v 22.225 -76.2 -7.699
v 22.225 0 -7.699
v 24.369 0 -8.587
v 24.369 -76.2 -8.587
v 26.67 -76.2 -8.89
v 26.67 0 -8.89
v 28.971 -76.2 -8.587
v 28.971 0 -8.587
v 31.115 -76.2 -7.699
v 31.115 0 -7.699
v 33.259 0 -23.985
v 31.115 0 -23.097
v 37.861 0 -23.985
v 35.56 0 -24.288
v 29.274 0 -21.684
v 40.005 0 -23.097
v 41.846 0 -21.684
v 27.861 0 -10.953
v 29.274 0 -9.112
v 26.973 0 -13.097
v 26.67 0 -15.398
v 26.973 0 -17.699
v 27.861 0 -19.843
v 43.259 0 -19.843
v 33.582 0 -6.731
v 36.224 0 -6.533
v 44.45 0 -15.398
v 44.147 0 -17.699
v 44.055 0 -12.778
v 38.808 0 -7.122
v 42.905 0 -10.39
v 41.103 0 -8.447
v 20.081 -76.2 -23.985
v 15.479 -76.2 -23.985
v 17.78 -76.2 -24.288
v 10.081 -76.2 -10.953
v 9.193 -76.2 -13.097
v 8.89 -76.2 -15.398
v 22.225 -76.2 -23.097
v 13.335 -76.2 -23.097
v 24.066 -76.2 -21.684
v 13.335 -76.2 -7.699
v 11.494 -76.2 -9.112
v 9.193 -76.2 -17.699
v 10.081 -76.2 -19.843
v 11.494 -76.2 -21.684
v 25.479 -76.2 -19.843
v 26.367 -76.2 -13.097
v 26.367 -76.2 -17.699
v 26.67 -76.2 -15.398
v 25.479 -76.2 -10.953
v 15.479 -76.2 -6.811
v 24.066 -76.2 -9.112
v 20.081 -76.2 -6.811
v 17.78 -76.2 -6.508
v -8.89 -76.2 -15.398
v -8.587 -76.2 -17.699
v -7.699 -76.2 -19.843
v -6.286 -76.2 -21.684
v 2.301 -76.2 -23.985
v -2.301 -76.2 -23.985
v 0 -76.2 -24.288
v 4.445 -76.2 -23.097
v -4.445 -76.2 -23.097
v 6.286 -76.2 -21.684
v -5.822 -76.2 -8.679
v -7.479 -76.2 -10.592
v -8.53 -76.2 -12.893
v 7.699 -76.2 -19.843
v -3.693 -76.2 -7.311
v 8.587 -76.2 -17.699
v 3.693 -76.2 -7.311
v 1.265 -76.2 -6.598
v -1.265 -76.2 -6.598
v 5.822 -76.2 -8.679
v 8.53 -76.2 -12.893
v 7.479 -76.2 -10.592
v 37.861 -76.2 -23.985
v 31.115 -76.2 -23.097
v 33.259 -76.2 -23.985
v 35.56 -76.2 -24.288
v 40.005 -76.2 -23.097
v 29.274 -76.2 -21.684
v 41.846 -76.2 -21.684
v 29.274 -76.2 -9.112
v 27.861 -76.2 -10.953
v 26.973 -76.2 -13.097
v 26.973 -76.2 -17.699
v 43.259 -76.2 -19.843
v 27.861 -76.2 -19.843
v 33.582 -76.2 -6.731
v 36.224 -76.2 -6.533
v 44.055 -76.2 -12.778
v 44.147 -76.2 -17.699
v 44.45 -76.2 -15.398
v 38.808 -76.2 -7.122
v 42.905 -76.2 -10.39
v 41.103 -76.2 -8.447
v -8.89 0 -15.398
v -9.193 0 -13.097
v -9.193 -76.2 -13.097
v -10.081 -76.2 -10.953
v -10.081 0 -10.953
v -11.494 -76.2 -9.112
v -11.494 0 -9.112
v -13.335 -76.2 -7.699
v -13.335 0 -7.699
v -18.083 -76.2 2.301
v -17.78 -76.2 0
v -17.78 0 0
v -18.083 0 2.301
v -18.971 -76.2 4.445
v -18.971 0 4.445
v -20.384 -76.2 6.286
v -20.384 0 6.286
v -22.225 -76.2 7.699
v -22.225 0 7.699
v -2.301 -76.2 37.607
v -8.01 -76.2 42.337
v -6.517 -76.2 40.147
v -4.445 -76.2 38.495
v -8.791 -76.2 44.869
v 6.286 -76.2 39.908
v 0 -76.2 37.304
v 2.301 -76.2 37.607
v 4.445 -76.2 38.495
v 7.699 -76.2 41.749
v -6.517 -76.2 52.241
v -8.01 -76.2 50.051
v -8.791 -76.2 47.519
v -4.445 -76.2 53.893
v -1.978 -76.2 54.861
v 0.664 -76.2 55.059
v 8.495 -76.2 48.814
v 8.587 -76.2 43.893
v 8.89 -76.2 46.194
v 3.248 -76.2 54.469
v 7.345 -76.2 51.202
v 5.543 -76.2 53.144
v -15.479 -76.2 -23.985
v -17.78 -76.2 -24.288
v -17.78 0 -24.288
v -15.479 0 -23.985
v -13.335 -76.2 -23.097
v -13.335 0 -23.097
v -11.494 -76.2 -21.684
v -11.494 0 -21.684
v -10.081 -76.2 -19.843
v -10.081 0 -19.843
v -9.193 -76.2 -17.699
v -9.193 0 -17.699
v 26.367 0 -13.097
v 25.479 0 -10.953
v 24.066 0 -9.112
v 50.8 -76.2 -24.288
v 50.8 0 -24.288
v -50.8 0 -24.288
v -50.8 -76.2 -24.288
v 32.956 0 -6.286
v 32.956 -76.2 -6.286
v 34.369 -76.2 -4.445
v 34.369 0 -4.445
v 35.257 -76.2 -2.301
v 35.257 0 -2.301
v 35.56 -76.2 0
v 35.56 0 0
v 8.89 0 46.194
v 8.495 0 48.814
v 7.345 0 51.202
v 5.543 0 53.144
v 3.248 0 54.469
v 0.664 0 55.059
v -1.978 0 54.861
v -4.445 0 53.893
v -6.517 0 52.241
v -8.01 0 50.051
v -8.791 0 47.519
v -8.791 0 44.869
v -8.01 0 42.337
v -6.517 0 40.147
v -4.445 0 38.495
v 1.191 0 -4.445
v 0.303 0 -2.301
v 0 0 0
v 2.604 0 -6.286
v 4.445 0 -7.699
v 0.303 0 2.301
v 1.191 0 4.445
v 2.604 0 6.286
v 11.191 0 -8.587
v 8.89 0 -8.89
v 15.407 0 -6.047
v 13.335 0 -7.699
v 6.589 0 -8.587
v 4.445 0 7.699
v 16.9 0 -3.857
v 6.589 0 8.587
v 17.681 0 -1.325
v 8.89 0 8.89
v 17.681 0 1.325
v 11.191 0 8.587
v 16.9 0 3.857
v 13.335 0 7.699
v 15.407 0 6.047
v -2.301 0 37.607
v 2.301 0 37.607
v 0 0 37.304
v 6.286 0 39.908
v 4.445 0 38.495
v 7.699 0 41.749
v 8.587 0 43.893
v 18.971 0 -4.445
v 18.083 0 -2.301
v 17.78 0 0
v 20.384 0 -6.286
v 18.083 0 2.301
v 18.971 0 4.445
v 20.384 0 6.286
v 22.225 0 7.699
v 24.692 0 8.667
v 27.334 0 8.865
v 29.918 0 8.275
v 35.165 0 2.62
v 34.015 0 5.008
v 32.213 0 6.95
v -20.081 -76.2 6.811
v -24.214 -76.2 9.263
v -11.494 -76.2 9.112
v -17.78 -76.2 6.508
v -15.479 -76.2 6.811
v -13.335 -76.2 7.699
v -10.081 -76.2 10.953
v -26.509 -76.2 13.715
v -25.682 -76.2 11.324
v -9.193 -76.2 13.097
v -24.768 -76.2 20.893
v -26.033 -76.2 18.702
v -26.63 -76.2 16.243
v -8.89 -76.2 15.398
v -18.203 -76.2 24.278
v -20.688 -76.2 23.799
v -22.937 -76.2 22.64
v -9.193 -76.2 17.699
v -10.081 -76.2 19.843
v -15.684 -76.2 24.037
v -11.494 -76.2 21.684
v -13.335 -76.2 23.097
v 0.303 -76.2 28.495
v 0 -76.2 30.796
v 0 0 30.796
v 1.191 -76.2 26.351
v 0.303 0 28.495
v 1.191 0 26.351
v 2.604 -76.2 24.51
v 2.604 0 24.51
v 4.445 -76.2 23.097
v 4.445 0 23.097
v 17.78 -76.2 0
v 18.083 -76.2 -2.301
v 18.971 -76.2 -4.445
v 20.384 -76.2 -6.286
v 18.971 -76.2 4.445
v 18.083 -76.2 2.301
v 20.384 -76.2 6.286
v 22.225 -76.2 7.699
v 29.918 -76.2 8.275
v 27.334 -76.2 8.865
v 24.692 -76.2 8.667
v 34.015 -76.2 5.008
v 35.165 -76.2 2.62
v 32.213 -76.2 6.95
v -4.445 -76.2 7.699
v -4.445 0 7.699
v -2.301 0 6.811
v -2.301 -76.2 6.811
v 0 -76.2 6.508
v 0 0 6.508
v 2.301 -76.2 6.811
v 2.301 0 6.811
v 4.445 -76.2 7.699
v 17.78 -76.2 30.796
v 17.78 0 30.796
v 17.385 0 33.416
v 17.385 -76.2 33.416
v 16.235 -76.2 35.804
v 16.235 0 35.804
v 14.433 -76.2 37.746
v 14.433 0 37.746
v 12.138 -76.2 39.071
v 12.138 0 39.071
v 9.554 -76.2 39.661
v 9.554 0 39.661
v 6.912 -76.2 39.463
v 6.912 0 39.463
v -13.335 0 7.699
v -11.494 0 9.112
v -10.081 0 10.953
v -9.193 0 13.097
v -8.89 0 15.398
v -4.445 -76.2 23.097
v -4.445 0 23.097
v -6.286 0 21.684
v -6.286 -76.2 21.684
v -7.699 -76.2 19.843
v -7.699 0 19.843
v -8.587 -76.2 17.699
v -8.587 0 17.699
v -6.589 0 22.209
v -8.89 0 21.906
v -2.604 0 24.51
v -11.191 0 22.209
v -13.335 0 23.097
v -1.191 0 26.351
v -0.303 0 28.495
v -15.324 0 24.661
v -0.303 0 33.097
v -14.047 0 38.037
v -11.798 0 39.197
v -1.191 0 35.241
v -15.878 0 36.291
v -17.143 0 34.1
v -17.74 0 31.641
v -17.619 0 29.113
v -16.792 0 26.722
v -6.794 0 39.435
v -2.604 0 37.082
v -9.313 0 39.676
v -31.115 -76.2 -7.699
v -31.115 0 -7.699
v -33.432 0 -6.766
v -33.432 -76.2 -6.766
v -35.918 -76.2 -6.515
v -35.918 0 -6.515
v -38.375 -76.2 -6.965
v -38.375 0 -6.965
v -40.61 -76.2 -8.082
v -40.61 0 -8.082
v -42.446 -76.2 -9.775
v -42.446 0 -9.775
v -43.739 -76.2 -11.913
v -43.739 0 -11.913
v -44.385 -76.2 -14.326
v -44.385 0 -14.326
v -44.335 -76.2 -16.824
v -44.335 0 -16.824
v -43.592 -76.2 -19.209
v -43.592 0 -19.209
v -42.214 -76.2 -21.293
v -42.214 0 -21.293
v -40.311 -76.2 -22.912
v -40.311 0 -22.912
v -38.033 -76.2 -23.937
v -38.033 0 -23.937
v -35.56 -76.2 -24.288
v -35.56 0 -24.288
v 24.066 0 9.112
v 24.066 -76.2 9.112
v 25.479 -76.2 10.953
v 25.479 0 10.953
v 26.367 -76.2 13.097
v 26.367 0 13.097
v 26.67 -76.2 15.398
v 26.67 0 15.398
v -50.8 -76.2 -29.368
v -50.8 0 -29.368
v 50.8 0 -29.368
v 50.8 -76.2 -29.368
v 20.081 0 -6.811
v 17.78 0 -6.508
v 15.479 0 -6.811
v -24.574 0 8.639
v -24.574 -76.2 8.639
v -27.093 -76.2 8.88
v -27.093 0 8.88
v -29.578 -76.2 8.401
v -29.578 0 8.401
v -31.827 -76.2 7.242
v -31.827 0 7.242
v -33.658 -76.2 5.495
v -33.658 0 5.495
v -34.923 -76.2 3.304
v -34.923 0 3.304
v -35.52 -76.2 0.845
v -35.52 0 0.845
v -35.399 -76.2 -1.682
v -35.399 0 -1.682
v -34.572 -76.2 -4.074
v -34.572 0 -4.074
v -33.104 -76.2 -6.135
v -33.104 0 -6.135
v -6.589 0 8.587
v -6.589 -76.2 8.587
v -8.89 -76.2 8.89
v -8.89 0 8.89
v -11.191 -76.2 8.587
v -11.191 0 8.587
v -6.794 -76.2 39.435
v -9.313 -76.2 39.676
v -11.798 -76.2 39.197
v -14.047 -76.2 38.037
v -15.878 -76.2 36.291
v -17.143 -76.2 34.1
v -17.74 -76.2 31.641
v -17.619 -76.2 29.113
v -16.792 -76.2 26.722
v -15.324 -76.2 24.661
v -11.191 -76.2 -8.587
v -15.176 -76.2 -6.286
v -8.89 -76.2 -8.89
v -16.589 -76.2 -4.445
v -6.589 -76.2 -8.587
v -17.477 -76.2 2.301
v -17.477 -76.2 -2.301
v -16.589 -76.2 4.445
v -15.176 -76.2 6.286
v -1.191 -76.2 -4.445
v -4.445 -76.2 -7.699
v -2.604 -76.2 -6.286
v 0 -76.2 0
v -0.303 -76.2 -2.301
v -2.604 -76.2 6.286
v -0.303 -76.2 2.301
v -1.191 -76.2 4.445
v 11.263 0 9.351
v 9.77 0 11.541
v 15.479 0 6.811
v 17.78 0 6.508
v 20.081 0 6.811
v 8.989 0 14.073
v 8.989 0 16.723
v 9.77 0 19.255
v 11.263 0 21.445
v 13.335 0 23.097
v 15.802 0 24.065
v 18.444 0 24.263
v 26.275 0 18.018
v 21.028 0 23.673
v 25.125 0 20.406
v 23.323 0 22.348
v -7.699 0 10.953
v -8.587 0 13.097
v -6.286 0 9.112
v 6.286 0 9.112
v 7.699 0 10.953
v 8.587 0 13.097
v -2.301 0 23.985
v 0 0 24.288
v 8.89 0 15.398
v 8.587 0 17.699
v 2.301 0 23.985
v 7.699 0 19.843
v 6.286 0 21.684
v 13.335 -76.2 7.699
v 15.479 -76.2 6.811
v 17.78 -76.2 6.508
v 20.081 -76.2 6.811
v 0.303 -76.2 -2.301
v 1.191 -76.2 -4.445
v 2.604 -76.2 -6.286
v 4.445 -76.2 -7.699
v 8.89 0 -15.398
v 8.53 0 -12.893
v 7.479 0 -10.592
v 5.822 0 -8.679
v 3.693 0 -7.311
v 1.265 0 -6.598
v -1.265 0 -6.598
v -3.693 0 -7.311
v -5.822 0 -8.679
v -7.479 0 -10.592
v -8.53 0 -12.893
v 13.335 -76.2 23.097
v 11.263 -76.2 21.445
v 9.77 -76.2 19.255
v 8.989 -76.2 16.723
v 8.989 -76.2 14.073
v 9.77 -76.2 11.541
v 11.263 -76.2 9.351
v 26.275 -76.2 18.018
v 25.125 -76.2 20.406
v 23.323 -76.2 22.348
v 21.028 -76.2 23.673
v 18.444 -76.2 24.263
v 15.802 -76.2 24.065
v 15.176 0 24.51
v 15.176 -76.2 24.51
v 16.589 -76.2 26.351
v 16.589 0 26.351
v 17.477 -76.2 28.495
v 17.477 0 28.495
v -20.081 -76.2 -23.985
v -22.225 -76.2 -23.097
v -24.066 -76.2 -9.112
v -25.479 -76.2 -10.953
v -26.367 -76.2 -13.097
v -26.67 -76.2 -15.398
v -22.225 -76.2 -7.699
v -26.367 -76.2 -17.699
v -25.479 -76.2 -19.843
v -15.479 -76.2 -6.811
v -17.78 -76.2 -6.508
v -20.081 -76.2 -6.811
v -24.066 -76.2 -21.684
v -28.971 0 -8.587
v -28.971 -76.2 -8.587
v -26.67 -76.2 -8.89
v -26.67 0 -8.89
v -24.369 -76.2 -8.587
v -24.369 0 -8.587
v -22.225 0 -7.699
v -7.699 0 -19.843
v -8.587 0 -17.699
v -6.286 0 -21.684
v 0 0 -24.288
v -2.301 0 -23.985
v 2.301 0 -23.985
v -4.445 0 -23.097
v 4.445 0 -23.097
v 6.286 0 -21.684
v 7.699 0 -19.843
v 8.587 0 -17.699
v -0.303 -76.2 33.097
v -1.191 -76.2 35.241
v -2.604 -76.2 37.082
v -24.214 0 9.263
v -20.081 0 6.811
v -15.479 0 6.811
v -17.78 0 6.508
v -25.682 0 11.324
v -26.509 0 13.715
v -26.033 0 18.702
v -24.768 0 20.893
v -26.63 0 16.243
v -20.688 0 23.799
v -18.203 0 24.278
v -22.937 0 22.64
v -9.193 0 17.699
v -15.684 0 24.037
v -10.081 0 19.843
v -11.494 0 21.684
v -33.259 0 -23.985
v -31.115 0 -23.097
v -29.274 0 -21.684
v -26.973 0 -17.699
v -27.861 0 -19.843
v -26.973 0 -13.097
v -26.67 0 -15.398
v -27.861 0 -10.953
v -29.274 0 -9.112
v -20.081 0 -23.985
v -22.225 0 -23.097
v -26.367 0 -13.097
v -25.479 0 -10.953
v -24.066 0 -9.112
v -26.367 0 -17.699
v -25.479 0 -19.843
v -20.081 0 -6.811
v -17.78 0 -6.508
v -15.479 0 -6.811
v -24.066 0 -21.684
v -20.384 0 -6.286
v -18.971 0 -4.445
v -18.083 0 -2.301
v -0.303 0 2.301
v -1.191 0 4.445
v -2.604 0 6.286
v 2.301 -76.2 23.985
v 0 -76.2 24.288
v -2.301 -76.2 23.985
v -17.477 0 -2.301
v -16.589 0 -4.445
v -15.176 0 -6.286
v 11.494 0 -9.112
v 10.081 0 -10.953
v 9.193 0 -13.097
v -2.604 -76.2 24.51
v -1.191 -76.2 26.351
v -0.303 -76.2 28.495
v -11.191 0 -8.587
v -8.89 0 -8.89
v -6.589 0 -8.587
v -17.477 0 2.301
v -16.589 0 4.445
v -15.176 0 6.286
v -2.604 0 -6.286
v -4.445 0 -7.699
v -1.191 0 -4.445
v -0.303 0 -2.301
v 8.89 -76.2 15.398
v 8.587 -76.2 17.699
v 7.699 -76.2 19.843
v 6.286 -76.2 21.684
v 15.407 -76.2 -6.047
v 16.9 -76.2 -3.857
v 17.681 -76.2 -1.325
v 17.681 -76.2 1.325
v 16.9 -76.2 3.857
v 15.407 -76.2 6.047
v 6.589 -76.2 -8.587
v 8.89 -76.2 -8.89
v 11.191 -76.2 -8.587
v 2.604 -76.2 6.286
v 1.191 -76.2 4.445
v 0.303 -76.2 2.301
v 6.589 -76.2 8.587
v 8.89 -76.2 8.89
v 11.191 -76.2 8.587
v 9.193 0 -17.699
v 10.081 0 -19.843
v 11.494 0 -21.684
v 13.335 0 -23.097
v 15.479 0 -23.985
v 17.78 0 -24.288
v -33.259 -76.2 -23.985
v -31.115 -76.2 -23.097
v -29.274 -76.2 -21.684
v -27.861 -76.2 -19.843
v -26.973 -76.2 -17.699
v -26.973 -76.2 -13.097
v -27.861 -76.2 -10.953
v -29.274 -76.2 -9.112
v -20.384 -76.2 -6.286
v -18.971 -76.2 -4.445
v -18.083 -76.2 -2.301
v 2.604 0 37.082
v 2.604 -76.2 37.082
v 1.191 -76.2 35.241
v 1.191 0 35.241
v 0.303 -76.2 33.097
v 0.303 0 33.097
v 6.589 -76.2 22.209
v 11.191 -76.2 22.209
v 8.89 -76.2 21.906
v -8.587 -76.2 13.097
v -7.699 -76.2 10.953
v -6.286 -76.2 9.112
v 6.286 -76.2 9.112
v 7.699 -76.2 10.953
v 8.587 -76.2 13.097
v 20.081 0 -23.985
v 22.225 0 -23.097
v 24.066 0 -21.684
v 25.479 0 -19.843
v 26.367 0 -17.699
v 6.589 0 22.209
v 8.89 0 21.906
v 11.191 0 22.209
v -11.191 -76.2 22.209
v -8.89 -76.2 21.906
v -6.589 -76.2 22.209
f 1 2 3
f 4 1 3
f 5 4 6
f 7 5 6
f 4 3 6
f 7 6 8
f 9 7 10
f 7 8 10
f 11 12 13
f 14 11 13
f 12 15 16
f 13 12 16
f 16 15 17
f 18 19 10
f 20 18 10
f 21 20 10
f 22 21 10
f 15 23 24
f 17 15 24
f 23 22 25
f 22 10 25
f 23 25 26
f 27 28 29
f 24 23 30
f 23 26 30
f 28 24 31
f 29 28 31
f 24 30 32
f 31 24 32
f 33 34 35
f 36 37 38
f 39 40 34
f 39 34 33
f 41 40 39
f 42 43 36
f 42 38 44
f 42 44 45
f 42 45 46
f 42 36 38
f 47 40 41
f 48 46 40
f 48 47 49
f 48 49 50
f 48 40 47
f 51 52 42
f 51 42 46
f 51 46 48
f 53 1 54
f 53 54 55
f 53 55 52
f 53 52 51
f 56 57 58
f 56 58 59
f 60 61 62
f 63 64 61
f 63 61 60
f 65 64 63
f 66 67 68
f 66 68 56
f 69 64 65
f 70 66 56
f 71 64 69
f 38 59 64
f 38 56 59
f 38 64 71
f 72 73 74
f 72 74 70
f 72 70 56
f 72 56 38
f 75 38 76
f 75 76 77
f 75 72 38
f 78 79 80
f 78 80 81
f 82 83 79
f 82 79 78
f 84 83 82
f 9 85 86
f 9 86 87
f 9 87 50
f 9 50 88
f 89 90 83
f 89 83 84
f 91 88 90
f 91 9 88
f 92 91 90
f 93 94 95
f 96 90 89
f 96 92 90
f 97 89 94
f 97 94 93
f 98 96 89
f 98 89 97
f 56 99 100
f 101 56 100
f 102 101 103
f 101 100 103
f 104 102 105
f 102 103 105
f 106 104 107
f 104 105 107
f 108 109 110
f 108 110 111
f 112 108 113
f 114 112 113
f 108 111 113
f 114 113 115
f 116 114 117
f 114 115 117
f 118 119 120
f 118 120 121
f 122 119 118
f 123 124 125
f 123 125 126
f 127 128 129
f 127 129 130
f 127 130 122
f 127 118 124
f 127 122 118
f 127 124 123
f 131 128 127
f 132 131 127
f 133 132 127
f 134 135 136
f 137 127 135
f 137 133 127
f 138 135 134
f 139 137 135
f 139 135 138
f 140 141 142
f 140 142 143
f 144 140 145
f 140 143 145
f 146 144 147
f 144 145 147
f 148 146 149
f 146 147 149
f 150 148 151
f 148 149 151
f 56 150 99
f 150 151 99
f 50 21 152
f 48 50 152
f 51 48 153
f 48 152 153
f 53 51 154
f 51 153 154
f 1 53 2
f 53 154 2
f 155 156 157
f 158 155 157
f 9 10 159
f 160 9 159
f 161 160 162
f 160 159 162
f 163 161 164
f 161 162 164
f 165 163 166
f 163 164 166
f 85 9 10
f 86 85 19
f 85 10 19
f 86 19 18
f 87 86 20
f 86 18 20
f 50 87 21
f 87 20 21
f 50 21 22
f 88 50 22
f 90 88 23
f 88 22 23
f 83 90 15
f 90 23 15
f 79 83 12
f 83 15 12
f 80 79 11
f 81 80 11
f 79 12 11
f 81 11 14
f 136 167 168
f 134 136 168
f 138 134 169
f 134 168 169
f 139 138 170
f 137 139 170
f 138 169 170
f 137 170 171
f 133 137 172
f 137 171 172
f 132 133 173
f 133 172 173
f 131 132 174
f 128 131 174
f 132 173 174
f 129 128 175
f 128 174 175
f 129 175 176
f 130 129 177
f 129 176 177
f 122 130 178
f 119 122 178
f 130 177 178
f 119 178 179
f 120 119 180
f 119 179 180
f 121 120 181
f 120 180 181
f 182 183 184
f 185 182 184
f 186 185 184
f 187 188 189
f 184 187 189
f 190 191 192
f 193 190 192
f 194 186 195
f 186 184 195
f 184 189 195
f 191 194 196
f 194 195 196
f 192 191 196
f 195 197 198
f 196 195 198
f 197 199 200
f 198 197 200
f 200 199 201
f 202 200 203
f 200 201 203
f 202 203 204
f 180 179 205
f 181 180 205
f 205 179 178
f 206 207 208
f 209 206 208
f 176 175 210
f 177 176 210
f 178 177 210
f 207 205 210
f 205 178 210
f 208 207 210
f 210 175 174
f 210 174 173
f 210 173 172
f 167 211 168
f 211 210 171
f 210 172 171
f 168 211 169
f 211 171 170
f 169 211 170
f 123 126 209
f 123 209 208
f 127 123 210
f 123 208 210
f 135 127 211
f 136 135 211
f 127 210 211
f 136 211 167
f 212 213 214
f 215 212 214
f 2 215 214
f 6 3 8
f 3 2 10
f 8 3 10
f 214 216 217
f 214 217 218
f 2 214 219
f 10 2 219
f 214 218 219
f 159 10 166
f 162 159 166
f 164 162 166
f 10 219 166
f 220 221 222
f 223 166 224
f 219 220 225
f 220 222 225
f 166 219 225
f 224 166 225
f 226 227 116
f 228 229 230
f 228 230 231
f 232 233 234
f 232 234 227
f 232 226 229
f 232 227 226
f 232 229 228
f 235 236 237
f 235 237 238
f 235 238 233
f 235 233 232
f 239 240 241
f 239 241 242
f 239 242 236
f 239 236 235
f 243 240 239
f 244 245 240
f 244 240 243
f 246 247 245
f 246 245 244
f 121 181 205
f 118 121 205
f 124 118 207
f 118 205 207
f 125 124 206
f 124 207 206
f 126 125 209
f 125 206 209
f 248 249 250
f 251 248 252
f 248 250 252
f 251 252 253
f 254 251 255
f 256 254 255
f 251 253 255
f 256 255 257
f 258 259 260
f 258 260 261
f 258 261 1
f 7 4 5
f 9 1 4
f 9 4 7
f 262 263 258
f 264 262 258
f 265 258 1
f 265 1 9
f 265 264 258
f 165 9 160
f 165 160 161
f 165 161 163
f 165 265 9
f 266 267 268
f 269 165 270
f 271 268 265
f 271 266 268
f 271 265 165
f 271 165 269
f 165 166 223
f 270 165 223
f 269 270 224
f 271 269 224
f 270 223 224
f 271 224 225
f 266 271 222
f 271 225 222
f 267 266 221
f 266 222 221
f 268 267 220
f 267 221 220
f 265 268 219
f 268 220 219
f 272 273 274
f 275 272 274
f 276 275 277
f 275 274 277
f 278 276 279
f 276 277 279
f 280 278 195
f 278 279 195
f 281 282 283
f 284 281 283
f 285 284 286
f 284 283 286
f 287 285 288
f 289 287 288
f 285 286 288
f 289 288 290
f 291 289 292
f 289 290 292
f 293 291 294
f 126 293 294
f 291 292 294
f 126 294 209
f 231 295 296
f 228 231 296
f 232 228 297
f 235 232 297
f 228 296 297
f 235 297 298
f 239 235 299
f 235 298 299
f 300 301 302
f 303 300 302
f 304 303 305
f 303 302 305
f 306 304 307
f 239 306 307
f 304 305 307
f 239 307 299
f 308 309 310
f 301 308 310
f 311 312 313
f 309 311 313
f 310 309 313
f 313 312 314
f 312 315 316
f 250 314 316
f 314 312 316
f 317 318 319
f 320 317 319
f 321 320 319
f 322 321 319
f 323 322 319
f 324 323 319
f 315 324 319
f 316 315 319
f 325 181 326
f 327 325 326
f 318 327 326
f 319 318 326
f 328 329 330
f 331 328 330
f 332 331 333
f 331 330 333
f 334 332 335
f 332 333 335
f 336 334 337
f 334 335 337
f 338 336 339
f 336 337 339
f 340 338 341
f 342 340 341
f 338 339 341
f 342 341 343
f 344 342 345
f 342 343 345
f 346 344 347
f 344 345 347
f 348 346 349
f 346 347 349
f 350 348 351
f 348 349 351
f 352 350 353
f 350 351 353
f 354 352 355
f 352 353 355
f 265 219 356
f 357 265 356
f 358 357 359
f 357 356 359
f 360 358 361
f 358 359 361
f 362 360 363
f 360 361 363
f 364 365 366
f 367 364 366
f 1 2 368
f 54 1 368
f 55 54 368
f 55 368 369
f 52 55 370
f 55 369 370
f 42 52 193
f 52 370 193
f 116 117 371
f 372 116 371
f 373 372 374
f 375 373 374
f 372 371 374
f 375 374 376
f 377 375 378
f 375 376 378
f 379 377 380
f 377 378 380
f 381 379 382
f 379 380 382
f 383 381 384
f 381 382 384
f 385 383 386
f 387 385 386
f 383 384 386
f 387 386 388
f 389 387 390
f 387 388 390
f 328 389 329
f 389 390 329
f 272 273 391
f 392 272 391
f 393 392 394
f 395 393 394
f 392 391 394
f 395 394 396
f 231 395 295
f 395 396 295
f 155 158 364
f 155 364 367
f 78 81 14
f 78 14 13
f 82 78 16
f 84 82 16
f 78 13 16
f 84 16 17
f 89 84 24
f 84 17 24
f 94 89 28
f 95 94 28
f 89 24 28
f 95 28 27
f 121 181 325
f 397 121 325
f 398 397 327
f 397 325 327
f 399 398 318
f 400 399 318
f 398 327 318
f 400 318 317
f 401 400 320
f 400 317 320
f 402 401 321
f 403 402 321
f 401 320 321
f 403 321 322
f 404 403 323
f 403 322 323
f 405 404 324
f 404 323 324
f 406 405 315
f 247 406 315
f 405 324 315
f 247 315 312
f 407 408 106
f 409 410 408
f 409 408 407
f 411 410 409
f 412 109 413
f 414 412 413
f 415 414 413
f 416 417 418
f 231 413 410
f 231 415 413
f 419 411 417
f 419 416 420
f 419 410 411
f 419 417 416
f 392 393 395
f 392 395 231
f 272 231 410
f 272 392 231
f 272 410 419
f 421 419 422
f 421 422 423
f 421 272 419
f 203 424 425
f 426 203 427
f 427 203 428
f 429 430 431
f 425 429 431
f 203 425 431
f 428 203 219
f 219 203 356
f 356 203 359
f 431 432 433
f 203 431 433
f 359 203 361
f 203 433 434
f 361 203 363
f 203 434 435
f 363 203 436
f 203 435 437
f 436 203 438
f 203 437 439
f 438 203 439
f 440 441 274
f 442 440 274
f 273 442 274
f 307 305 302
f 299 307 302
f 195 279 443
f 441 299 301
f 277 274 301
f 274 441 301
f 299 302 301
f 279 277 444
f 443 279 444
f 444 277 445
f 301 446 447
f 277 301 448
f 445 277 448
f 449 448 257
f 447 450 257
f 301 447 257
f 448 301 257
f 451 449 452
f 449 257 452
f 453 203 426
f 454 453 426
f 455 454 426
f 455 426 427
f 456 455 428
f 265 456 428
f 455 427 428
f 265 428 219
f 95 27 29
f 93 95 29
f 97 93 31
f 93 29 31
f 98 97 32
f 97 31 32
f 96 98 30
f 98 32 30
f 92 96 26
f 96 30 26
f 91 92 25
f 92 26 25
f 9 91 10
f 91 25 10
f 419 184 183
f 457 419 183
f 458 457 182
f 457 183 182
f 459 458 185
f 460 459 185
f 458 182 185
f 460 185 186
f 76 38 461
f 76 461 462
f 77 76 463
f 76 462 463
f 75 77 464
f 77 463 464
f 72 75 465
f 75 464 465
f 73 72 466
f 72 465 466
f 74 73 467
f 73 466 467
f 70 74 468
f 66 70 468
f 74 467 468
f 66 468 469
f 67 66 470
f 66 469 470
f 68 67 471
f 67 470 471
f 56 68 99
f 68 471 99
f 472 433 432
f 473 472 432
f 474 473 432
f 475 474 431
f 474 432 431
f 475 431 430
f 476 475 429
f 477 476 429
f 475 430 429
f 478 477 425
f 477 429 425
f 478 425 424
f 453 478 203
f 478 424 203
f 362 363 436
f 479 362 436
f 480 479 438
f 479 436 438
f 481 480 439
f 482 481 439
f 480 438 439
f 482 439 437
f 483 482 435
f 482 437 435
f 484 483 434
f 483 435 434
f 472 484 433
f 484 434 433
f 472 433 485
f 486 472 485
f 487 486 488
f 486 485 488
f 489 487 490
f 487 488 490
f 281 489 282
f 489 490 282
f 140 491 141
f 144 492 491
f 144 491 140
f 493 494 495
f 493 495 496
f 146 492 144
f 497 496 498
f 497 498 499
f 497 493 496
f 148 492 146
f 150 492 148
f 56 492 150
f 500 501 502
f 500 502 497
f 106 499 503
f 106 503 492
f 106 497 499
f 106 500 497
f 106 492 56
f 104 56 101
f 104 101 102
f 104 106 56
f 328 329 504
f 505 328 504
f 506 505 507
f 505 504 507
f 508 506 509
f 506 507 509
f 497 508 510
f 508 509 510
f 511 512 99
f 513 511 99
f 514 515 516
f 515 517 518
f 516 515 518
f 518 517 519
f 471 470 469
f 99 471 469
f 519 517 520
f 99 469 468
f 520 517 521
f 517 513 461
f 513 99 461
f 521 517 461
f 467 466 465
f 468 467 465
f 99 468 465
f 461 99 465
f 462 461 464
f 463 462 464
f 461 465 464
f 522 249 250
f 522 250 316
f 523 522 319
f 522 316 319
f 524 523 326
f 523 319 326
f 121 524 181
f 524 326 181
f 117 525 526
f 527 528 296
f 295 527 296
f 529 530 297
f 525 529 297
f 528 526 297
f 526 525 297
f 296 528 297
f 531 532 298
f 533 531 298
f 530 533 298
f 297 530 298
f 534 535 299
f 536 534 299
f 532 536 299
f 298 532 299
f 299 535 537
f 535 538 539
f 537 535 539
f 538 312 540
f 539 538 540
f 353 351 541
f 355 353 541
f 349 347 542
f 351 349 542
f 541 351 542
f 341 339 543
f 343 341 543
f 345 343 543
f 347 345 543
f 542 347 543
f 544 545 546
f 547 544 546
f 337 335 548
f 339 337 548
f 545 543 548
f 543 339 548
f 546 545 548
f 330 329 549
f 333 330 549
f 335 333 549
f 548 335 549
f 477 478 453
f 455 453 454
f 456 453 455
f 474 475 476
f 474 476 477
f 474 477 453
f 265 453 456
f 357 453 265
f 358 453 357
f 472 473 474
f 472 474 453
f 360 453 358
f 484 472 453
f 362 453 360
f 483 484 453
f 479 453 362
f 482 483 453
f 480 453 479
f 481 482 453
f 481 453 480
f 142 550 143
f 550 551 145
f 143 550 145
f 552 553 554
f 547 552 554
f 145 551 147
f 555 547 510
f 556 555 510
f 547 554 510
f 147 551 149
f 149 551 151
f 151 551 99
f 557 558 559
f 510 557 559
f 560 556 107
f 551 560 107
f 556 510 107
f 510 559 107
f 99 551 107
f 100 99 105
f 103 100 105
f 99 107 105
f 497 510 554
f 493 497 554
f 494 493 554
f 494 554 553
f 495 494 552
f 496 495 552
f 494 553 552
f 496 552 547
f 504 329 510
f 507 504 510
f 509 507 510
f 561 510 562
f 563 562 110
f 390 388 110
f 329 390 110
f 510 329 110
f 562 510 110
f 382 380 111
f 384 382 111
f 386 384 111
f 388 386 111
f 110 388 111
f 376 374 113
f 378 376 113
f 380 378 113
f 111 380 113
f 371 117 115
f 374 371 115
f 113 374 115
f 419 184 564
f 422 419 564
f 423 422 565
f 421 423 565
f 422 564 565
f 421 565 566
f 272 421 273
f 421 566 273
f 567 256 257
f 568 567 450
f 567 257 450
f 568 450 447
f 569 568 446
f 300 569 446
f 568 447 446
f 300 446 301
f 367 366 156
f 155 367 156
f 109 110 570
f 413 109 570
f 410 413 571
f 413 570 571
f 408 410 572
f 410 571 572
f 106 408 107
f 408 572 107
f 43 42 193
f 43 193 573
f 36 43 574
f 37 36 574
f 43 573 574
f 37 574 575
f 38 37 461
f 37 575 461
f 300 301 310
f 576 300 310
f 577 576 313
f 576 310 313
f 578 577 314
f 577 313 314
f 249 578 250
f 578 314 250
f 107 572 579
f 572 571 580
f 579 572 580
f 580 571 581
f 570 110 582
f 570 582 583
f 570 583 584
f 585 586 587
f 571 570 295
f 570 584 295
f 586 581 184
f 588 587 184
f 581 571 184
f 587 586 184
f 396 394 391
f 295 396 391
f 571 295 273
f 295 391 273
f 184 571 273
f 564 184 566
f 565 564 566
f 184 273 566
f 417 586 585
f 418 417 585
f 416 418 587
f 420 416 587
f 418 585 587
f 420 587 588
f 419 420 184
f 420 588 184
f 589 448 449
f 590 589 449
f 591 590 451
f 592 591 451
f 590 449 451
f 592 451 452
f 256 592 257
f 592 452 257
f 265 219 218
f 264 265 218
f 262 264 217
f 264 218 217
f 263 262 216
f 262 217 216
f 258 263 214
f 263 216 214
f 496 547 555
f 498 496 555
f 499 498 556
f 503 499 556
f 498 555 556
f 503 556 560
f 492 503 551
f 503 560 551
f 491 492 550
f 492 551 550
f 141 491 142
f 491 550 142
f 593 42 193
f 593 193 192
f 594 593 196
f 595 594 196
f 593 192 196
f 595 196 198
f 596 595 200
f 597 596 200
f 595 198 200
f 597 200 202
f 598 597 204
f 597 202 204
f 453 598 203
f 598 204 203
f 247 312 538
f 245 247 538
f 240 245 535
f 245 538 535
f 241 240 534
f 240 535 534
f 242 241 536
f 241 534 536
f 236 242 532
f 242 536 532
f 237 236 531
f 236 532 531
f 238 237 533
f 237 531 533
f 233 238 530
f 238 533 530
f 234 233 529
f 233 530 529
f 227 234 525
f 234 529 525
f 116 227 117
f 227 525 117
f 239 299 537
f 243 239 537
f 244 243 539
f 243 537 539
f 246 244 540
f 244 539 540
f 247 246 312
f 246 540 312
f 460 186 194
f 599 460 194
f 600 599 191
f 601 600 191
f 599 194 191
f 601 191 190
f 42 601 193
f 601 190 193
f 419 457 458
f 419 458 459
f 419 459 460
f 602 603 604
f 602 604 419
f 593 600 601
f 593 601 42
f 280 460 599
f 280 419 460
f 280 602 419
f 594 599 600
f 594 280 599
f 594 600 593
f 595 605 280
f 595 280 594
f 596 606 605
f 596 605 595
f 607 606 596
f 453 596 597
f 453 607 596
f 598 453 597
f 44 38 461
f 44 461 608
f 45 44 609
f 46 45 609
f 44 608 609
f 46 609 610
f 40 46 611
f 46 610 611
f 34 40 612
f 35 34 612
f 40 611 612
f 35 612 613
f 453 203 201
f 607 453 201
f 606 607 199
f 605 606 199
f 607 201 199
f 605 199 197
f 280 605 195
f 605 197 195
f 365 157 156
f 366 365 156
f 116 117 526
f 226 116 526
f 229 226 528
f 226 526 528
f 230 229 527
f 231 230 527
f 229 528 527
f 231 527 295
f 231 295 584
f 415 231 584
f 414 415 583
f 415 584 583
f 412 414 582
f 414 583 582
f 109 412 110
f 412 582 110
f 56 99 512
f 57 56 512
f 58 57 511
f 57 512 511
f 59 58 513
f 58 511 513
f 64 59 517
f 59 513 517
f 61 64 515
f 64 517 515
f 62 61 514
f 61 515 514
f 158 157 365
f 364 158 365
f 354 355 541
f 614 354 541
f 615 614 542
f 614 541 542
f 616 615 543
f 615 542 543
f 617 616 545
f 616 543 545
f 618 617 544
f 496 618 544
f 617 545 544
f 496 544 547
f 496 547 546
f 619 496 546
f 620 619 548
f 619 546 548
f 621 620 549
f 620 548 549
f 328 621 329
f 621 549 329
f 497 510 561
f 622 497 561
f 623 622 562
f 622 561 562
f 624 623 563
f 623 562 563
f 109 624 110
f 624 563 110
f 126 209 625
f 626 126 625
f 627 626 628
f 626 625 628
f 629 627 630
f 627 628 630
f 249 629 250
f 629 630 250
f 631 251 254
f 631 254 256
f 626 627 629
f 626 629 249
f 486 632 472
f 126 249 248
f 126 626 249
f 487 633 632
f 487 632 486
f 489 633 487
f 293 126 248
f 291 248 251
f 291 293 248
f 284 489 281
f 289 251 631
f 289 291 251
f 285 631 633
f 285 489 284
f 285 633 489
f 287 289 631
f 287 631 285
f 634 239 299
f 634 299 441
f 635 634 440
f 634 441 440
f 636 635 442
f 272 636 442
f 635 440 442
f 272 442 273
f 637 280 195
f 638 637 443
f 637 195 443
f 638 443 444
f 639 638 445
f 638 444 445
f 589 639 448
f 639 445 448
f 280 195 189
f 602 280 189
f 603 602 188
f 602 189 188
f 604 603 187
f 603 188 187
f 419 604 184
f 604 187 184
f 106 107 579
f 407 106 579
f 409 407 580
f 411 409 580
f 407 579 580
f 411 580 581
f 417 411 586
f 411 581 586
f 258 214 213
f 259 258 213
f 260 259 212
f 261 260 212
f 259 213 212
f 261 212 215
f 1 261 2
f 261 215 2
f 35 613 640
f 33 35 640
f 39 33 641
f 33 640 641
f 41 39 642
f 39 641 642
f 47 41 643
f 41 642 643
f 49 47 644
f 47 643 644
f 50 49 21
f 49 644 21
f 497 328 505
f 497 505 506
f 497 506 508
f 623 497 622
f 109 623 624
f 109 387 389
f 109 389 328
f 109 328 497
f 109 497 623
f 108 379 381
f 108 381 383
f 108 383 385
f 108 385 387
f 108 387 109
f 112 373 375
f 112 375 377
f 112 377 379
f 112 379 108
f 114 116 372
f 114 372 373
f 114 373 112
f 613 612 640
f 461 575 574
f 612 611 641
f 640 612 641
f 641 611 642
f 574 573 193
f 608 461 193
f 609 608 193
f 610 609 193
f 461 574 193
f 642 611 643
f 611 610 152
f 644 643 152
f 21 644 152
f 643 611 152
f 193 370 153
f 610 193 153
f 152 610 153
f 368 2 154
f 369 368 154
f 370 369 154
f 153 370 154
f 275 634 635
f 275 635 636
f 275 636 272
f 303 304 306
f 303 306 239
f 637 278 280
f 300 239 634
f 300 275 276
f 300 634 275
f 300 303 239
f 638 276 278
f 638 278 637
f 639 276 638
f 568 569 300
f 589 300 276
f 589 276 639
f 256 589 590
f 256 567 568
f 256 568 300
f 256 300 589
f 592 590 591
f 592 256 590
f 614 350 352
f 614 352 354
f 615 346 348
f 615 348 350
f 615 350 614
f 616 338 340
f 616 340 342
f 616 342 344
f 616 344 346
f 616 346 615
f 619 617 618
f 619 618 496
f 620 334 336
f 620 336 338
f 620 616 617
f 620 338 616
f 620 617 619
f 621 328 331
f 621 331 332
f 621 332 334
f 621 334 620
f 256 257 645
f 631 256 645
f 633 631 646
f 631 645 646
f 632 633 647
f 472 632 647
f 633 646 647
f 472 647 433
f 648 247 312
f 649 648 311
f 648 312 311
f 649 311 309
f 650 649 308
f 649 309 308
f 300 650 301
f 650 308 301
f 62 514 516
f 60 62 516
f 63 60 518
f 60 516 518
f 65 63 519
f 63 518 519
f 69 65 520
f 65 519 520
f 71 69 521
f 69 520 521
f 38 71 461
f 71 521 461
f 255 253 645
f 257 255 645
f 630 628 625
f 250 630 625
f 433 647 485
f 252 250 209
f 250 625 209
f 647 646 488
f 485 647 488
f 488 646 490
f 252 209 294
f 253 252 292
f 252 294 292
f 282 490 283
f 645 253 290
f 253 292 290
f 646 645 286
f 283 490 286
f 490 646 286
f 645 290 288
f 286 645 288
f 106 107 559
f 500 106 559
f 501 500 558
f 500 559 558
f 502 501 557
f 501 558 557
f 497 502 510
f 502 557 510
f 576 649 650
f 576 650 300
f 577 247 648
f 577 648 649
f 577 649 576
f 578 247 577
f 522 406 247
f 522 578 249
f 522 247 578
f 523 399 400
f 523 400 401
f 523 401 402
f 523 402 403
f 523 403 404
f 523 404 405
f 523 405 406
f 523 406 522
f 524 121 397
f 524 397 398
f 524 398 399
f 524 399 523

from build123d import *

# Parameters (mm, degrees)
F1_DEPTH = 76.2


with BuildPart() as f1:
    # F0 (on Front) → F1 (new body)
    with BuildSketch(Plane.XZ):
        with BuildLine():
            ThreePointArc((-13.3350000511, 23.0968975485), (-25.478965917, 19.8429315452), (-22.224999783, 7.6989657144))
            ThreePointArc((-22.224999783, 7.6989657144), (-17.7799997536, 6.5079316793), (-13.3349997903, 7.6989659607))
            ThreePointArc((-13.3349997903, 7.6989659607), (-10.0810340998, 10.9529317842), (-8.89, 15.3979316793))
            ThreePointArc((-8.89, 15.3979316793), (-10.0810341751, 19.8429317049), (-13.3350000511, 23.0968975485))
        make_face()
    extrude(amount=F1_DEPTH)


with BuildPart() as f1b:
    # F0 (on Front) → F1, piece 2 (new body)
    with BuildSketch(Plane.XZ):
        with BuildLine():
            ThreePointArc((-8.89, 15.3979316793), (-7.6989658311, 10.9529316645), (-4.4449999705, 7.6989658226))
            ThreePointArc((-4.4449999705, 7.6989658226), (6.75e-08, 6.5079316793), (4.4450000875, 7.6989658901))
            ThreePointArc((4.4450000875, 7.6989658901), (7.6989658649, 10.952931723), (8.89, 15.3979316793))
            ThreePointArc((8.89, 15.3979316793), (7.6989658283, 19.842931699), (4.4449999606, 23.0968975417))
            ThreePointArc((4.4449999606, 23.0968975417), (-1.166e-07, 24.2879316793), (-4.4450001625, 23.0968974251))
            ThreePointArc((-4.4450001625, 23.0968974251), (-7.6989658866, 19.842931598), (-8.89, 15.3979316793))
        make_face()
    extrude(amount=F1_DEPTH)


with BuildPart() as f1c:
    # F0 (on Front) → F1, piece 3 (new body)
    with BuildSketch(Plane.XZ):
        with BuildLine():
            ThreePointArc((8.89, 15.3979316793), (10.0810341482, 10.9529317004), (13.3349999579, 7.698965864))
            ThreePointArc((13.3349999579, 7.698965864), (17.780000023, 6.5079316793), (22.2250000819, 7.6989658869))
            ThreePointArc((22.2250000819, 7.6989658869), (25.4789658633, 10.9529317202), (26.67, 15.3979316793))
            ThreePointArc((26.67, 15.3979316793), (22.2250000328, 23.0968975), (13.3350000657, 23.0968975568))
            ThreePointArc((13.3350000657, 23.0968975568), (10.0810341793, 19.8429317121), (8.89, 15.3979316793))
        make_face()
    extrude(amount=F1_DEPTH)


with BuildPart() as f1d:
    # F0 (on Front) → F1, piece 4 (new body)
    with BuildSketch(Plane.XZ):
        with BuildLine():
            ThreePointArc((22.2250000819, 7.6989658869), (18.971034184, 4.445000041), (17.78, 0))
            ThreePointArc((17.78, 0), (18.9710341591, -4.4449999979), (22.2249999958, -7.6989658372))
            ThreePointArc((22.2249999958, -7.6989658372), (26.6699999325, -8.89), (31.1149998873, -7.6989659047))
            ThreePointArc((31.1149998873, -7.6989659047), (34.3689658071, -4.4450000564), (35.56, 0))
            ThreePointArc((35.56, 0), (31.115000041, 7.698965816), (22.2250000819, 7.6989658869))
        make_face()
    extrude(amount=F1_DEPTH)


with BuildPart() as f1e:
    # F0 (on Front) → F1, piece 5 (new body)
    with BuildSketch(Plane.XZ):
        with BuildLine():
            ThreePointArc((4.4450000875, 7.6989658901), (1.1910341856, 4.4450000437), (0, 0))
            ThreePointArc((0, 0), (1.1910341607, -4.4450000007), (4.4450000013, -7.6989658404))
            ThreePointArc((4.4450000013, -7.6989658404), (8.8899999644, -8.89), (13.3349999371, -7.698965876))
            ThreePointArc((13.3349999371, -7.698965876), (16.5889658215, -4.4450000314), (17.78, 0))
            ThreePointArc((17.78, 0), (16.5889658275, 4.4450000211), (13.3349999579, 7.698965864))
            ThreePointArc((13.3349999579, 7.698965864), (8.8900000262, 8.89), (4.4450000875, 7.6989658901))
        make_face()
    extrude(amount=F1_DEPTH)


with BuildPart() as f1f:
    # F0 (on Front) → F1, piece 6 (new body)
    with BuildSketch(Plane.XZ):
        with BuildLine():
            ThreePointArc((-13.3349997903, 7.6989659607), (-16.5889657791, 4.4450001049), (-17.78, 0))
            ThreePointArc((-17.78, 0), (-16.5889658625, -4.4449999603), (-13.3350000793, -7.6989657939))
            ThreePointArc((-13.3350000793, -7.6989657939), (-8.8900000289, -8.89), (-4.4449999708, -7.6989658228))
            ThreePointArc((-4.4449999708, -7.6989658228), (-1.1910341519, -4.4449999854), (0, 0))
            ThreePointArc((0, 0), (-1.1910341518, 4.4449999853), (-4.4449999705, 7.6989658226))
            ThreePointArc((-4.4449999705, 7.6989658226), (-8.8899998619, 8.89), (-13.3349997903, 7.6989659607))
        make_face()
    extrude(amount=F1_DEPTH)


with BuildPart() as f1g:
    # F0 (on Front) → F1, piece 7 (new body)
    with BuildSketch(Plane.XZ):
        with BuildLine():
            ThreePointArc((-22.2250001435, -7.6989659225), (-18.9710342018, -4.4450000718), (-17.78, 0))
            ThreePointArc((-17.78, 0), (-18.9710340977, 4.4449998915), (-22.224999783, 7.6989657144))
            ThreePointArc((-22.224999783, 7.6989657144), (-34.3689657758, 4.4450001106), (-31.1150000042, -7.6989658372))
            ThreePointArc((-31.1150000042, -7.6989658372), (-26.6700000853, -8.89), (-22.2250001435, -7.6989659225))
        make_face()
    extrude(amount=F1_DEPTH)


with BuildPart() as f1h:
    # F0 (on Front) → F1, piece 8 (new body)
    with BuildSketch(Plane.XZ):
        with BuildLine():
            ThreePointArc((-26.67, -15.3979316793), (-27.8610341616, -10.9529316772), (-31.1150000042, -7.6989658372))
            ThreePointArc((-31.1150000042, -7.6989658372), (-44.1470805963, -13.0970303707), (-35.56, -24.2879316793))
            ThreePointArc((-35.56, -24.2879316793), (-29.2738207153, -21.684110964), (-26.67, -15.3979316793))
        make_face()
    extrude(amount=F1_DEPTH)


with BuildPart() as f1i:
    # F0 (on Front) → F1, piece 9 (new body)
    with BuildSketch(Plane.XZ):
        with BuildLine():
            ThreePointArc((-13.3350000793, -7.6989657939), (-17.7800001286, -6.5079316793), (-22.2250001435, -7.6989659225))
            ThreePointArc((-22.2250001435, -7.6989659225), (-25.4789658811, -10.952931751), (-26.67, -15.3979316793))
            ThreePointArc((-26.67, -15.3979316793), (-24.0661792991, -21.6841109496), (-17.7800000407, -24.2879316793))
            ThreePointArc((-17.7800000407, -24.2879316793), (-11.4938207296, -21.6841109784), (-8.89, -15.3979316793))
            ThreePointArc((-8.89, -15.3979316793), (-10.0810341832, -10.9529316396), (-13.3350000793, -7.6989657939))
        make_face()
    extrude(amount=F1_DEPTH)


with BuildPart() as f1j:
    # F0 (on Front) → F1, piece 10 (new body)
    with BuildSketch(Plane.XZ):
        with BuildLine():
            ThreePointArc((4.4450000013, -7.6989658404), (1.76e-08, -6.5079316793), (-4.4449999708, -7.6989658228))
            ThreePointArc((-4.4449999708, -7.6989658228), (-7.6989658312, -10.9529316647), (-8.89, -15.3979316793))
            ThreePointArc((-8.89, -15.3979316793), (-6.2861793033, -21.6841109454), (-5.26e-08, -24.2879316793))
            ThreePointArc((-5.26e-08, -24.2879316793), (6.2861792662, -21.6841109826), (8.89, -15.3979316793))
            ThreePointArc((8.89, -15.3979316793), (7.69896584, -10.9529316799), (4.4450000013, -7.6989658404))
        make_face()
    extrude(amount=F1_DEPTH)


with BuildPart() as f1k:
    # F0 (on Front) → F1, piece 11 (new body)
    with BuildSketch(Plane.XZ):
        with BuildLine():
            ThreePointArc((22.2249999958, -7.6989658372), (17.7799999612, -6.5079316793), (13.3349999371, -7.698965876))
            ThreePointArc((13.3349999371, -7.698965876), (10.0810341422, -10.9529317107), (8.89, -15.3979316793))
            ThreePointArc((8.89, -15.3979316793), (11.4938207085, -21.6841109572), (17.7799999808, -24.2879316793))
            ThreePointArc((17.7799999808, -24.2879316793), (24.066179278, -21.6841109708), (26.67, -15.3979316793))
            ThreePointArc((26.67, -15.3979316793), (25.4789658384, -10.9529316772), (22.2249999958, -7.6989658372))
        make_face()
    extrude(amount=F1_DEPTH)


with BuildPart() as f1l:
    # F0 (on Front) → F1, piece 12 (new body)
    with BuildSketch(Plane.XZ):
        with BuildLine():
            ThreePointArc((31.1149998873, -7.6989659047), (27.8610341278, -10.9529317356), (26.67, -15.3979316793))
            ThreePointArc((26.67, -15.3979316793), (29.2738207153, -21.684110964), (35.56, -24.2879316793))
            ThreePointArc((35.56, -24.2879316793), (41.8461792847, -21.684110964), (44.45, -15.3979316793))
            ThreePointArc((44.45, -15.3979316793), (40.0049999436, -7.6989658071), (31.1149998873, -7.6989659047))
        make_face()
    extrude(amount=F1_DEPTH)


with BuildPart() as f1m:
    # F0 (on Front) → F1, piece 13 (new body)
    with BuildSketch(Plane.XZ):
        Polygon((-17.7800000407, -24.2879316793), (-35.56, -24.2879316793), (-50.8, -24.2879316793), (-50.8, -29.3679316793), (50.8, -29.3679316793), (50.8, -24.2879316793), (35.56, -24.2879316793), (17.7799999808, -24.2879316793), (-5.26e-08, -24.2879316793), align=None)
    extrude(amount=F1_DEPTH)


with BuildPart() as f1n:
    # F0 (on Front) → F1, piece 14 (new body)
    with BuildSketch(Plane.XZ):
        with BuildLine():
            ThreePointArc((-4.4449998636, 38.4948291195), (-16.5889657855, 35.2408634523), (-13.3350000511, 23.0968975485))
            ThreePointArc((-13.3350000511, 23.0968975485), (-8.8900001234, 21.9058633586), (-4.4450001625, 23.0968974251))
            ThreePointArc((-4.4450001625, 23.0968974251), (-1.1910342073, 26.3508632773), (0, 30.7958633586))
            ThreePointArc((0, 30.7958633586), (-1.191034121, 35.2408632904), (-4.4449998636, 38.4948291195))
        make_face()
    extrude(amount=F1_DEPTH)


with BuildPart() as f1o:
    # F0 (on Front) → F1, piece 15 (new body)
    with BuildSketch(Plane.XZ):
        with BuildLine():
            ThreePointArc((4.4449997876, 38.4948290756), (1.191034099, 35.2408632524), (0, 30.7958633586))
            ThreePointArc((0, 30.7958633586), (1.191034149, 26.3508633783), (4.4449999606, 23.0968975417))
            ThreePointArc((4.4449999606, 23.0968975417), (8.8900000152, 21.9058633586), (13.3350000657, 23.0968975568))
            ThreePointArc((13.3350000657, 23.0968975568), (16.5889658586, 26.3508633914), (17.78, 30.7958633586))
            ThreePointArc((17.78, 30.7958633586), (13.3349998938, 38.4948292595), (4.4449997876, 38.4948290756))
        make_face()
    extrude(amount=F1_DEPTH)


with BuildPart() as f1p:
    # F0 (on Front) → F1, piece 16 (new body)
    with BuildSketch(Plane.XZ):
        with BuildLine():
            ThreePointArc((8.89, 46.1937950379), (-4.4450000682, 53.8927608381), (-4.4449998636, 38.4948291195))
            ThreePointArc((-4.4449998636, 38.4948291195), (-4.39e-08, 37.3037950379), (4.4449997876, 38.4948290756))
            ThreePointArc((4.4449997876, 38.4948290756), (7.6989657783, 41.7487949317), (8.89, 46.1937950379))
        make_face()
    extrude(amount=F1_DEPTH)


solid = Compound([f1.part, f1b.part, f1c.part, f1d.part, f1e.part, f1f.part, f1g.part, f1h.part, f1i.part, f1j.part, f1k.part, f1l.part, f1m.part, f1n.part, f1o.part, f1p.part])
